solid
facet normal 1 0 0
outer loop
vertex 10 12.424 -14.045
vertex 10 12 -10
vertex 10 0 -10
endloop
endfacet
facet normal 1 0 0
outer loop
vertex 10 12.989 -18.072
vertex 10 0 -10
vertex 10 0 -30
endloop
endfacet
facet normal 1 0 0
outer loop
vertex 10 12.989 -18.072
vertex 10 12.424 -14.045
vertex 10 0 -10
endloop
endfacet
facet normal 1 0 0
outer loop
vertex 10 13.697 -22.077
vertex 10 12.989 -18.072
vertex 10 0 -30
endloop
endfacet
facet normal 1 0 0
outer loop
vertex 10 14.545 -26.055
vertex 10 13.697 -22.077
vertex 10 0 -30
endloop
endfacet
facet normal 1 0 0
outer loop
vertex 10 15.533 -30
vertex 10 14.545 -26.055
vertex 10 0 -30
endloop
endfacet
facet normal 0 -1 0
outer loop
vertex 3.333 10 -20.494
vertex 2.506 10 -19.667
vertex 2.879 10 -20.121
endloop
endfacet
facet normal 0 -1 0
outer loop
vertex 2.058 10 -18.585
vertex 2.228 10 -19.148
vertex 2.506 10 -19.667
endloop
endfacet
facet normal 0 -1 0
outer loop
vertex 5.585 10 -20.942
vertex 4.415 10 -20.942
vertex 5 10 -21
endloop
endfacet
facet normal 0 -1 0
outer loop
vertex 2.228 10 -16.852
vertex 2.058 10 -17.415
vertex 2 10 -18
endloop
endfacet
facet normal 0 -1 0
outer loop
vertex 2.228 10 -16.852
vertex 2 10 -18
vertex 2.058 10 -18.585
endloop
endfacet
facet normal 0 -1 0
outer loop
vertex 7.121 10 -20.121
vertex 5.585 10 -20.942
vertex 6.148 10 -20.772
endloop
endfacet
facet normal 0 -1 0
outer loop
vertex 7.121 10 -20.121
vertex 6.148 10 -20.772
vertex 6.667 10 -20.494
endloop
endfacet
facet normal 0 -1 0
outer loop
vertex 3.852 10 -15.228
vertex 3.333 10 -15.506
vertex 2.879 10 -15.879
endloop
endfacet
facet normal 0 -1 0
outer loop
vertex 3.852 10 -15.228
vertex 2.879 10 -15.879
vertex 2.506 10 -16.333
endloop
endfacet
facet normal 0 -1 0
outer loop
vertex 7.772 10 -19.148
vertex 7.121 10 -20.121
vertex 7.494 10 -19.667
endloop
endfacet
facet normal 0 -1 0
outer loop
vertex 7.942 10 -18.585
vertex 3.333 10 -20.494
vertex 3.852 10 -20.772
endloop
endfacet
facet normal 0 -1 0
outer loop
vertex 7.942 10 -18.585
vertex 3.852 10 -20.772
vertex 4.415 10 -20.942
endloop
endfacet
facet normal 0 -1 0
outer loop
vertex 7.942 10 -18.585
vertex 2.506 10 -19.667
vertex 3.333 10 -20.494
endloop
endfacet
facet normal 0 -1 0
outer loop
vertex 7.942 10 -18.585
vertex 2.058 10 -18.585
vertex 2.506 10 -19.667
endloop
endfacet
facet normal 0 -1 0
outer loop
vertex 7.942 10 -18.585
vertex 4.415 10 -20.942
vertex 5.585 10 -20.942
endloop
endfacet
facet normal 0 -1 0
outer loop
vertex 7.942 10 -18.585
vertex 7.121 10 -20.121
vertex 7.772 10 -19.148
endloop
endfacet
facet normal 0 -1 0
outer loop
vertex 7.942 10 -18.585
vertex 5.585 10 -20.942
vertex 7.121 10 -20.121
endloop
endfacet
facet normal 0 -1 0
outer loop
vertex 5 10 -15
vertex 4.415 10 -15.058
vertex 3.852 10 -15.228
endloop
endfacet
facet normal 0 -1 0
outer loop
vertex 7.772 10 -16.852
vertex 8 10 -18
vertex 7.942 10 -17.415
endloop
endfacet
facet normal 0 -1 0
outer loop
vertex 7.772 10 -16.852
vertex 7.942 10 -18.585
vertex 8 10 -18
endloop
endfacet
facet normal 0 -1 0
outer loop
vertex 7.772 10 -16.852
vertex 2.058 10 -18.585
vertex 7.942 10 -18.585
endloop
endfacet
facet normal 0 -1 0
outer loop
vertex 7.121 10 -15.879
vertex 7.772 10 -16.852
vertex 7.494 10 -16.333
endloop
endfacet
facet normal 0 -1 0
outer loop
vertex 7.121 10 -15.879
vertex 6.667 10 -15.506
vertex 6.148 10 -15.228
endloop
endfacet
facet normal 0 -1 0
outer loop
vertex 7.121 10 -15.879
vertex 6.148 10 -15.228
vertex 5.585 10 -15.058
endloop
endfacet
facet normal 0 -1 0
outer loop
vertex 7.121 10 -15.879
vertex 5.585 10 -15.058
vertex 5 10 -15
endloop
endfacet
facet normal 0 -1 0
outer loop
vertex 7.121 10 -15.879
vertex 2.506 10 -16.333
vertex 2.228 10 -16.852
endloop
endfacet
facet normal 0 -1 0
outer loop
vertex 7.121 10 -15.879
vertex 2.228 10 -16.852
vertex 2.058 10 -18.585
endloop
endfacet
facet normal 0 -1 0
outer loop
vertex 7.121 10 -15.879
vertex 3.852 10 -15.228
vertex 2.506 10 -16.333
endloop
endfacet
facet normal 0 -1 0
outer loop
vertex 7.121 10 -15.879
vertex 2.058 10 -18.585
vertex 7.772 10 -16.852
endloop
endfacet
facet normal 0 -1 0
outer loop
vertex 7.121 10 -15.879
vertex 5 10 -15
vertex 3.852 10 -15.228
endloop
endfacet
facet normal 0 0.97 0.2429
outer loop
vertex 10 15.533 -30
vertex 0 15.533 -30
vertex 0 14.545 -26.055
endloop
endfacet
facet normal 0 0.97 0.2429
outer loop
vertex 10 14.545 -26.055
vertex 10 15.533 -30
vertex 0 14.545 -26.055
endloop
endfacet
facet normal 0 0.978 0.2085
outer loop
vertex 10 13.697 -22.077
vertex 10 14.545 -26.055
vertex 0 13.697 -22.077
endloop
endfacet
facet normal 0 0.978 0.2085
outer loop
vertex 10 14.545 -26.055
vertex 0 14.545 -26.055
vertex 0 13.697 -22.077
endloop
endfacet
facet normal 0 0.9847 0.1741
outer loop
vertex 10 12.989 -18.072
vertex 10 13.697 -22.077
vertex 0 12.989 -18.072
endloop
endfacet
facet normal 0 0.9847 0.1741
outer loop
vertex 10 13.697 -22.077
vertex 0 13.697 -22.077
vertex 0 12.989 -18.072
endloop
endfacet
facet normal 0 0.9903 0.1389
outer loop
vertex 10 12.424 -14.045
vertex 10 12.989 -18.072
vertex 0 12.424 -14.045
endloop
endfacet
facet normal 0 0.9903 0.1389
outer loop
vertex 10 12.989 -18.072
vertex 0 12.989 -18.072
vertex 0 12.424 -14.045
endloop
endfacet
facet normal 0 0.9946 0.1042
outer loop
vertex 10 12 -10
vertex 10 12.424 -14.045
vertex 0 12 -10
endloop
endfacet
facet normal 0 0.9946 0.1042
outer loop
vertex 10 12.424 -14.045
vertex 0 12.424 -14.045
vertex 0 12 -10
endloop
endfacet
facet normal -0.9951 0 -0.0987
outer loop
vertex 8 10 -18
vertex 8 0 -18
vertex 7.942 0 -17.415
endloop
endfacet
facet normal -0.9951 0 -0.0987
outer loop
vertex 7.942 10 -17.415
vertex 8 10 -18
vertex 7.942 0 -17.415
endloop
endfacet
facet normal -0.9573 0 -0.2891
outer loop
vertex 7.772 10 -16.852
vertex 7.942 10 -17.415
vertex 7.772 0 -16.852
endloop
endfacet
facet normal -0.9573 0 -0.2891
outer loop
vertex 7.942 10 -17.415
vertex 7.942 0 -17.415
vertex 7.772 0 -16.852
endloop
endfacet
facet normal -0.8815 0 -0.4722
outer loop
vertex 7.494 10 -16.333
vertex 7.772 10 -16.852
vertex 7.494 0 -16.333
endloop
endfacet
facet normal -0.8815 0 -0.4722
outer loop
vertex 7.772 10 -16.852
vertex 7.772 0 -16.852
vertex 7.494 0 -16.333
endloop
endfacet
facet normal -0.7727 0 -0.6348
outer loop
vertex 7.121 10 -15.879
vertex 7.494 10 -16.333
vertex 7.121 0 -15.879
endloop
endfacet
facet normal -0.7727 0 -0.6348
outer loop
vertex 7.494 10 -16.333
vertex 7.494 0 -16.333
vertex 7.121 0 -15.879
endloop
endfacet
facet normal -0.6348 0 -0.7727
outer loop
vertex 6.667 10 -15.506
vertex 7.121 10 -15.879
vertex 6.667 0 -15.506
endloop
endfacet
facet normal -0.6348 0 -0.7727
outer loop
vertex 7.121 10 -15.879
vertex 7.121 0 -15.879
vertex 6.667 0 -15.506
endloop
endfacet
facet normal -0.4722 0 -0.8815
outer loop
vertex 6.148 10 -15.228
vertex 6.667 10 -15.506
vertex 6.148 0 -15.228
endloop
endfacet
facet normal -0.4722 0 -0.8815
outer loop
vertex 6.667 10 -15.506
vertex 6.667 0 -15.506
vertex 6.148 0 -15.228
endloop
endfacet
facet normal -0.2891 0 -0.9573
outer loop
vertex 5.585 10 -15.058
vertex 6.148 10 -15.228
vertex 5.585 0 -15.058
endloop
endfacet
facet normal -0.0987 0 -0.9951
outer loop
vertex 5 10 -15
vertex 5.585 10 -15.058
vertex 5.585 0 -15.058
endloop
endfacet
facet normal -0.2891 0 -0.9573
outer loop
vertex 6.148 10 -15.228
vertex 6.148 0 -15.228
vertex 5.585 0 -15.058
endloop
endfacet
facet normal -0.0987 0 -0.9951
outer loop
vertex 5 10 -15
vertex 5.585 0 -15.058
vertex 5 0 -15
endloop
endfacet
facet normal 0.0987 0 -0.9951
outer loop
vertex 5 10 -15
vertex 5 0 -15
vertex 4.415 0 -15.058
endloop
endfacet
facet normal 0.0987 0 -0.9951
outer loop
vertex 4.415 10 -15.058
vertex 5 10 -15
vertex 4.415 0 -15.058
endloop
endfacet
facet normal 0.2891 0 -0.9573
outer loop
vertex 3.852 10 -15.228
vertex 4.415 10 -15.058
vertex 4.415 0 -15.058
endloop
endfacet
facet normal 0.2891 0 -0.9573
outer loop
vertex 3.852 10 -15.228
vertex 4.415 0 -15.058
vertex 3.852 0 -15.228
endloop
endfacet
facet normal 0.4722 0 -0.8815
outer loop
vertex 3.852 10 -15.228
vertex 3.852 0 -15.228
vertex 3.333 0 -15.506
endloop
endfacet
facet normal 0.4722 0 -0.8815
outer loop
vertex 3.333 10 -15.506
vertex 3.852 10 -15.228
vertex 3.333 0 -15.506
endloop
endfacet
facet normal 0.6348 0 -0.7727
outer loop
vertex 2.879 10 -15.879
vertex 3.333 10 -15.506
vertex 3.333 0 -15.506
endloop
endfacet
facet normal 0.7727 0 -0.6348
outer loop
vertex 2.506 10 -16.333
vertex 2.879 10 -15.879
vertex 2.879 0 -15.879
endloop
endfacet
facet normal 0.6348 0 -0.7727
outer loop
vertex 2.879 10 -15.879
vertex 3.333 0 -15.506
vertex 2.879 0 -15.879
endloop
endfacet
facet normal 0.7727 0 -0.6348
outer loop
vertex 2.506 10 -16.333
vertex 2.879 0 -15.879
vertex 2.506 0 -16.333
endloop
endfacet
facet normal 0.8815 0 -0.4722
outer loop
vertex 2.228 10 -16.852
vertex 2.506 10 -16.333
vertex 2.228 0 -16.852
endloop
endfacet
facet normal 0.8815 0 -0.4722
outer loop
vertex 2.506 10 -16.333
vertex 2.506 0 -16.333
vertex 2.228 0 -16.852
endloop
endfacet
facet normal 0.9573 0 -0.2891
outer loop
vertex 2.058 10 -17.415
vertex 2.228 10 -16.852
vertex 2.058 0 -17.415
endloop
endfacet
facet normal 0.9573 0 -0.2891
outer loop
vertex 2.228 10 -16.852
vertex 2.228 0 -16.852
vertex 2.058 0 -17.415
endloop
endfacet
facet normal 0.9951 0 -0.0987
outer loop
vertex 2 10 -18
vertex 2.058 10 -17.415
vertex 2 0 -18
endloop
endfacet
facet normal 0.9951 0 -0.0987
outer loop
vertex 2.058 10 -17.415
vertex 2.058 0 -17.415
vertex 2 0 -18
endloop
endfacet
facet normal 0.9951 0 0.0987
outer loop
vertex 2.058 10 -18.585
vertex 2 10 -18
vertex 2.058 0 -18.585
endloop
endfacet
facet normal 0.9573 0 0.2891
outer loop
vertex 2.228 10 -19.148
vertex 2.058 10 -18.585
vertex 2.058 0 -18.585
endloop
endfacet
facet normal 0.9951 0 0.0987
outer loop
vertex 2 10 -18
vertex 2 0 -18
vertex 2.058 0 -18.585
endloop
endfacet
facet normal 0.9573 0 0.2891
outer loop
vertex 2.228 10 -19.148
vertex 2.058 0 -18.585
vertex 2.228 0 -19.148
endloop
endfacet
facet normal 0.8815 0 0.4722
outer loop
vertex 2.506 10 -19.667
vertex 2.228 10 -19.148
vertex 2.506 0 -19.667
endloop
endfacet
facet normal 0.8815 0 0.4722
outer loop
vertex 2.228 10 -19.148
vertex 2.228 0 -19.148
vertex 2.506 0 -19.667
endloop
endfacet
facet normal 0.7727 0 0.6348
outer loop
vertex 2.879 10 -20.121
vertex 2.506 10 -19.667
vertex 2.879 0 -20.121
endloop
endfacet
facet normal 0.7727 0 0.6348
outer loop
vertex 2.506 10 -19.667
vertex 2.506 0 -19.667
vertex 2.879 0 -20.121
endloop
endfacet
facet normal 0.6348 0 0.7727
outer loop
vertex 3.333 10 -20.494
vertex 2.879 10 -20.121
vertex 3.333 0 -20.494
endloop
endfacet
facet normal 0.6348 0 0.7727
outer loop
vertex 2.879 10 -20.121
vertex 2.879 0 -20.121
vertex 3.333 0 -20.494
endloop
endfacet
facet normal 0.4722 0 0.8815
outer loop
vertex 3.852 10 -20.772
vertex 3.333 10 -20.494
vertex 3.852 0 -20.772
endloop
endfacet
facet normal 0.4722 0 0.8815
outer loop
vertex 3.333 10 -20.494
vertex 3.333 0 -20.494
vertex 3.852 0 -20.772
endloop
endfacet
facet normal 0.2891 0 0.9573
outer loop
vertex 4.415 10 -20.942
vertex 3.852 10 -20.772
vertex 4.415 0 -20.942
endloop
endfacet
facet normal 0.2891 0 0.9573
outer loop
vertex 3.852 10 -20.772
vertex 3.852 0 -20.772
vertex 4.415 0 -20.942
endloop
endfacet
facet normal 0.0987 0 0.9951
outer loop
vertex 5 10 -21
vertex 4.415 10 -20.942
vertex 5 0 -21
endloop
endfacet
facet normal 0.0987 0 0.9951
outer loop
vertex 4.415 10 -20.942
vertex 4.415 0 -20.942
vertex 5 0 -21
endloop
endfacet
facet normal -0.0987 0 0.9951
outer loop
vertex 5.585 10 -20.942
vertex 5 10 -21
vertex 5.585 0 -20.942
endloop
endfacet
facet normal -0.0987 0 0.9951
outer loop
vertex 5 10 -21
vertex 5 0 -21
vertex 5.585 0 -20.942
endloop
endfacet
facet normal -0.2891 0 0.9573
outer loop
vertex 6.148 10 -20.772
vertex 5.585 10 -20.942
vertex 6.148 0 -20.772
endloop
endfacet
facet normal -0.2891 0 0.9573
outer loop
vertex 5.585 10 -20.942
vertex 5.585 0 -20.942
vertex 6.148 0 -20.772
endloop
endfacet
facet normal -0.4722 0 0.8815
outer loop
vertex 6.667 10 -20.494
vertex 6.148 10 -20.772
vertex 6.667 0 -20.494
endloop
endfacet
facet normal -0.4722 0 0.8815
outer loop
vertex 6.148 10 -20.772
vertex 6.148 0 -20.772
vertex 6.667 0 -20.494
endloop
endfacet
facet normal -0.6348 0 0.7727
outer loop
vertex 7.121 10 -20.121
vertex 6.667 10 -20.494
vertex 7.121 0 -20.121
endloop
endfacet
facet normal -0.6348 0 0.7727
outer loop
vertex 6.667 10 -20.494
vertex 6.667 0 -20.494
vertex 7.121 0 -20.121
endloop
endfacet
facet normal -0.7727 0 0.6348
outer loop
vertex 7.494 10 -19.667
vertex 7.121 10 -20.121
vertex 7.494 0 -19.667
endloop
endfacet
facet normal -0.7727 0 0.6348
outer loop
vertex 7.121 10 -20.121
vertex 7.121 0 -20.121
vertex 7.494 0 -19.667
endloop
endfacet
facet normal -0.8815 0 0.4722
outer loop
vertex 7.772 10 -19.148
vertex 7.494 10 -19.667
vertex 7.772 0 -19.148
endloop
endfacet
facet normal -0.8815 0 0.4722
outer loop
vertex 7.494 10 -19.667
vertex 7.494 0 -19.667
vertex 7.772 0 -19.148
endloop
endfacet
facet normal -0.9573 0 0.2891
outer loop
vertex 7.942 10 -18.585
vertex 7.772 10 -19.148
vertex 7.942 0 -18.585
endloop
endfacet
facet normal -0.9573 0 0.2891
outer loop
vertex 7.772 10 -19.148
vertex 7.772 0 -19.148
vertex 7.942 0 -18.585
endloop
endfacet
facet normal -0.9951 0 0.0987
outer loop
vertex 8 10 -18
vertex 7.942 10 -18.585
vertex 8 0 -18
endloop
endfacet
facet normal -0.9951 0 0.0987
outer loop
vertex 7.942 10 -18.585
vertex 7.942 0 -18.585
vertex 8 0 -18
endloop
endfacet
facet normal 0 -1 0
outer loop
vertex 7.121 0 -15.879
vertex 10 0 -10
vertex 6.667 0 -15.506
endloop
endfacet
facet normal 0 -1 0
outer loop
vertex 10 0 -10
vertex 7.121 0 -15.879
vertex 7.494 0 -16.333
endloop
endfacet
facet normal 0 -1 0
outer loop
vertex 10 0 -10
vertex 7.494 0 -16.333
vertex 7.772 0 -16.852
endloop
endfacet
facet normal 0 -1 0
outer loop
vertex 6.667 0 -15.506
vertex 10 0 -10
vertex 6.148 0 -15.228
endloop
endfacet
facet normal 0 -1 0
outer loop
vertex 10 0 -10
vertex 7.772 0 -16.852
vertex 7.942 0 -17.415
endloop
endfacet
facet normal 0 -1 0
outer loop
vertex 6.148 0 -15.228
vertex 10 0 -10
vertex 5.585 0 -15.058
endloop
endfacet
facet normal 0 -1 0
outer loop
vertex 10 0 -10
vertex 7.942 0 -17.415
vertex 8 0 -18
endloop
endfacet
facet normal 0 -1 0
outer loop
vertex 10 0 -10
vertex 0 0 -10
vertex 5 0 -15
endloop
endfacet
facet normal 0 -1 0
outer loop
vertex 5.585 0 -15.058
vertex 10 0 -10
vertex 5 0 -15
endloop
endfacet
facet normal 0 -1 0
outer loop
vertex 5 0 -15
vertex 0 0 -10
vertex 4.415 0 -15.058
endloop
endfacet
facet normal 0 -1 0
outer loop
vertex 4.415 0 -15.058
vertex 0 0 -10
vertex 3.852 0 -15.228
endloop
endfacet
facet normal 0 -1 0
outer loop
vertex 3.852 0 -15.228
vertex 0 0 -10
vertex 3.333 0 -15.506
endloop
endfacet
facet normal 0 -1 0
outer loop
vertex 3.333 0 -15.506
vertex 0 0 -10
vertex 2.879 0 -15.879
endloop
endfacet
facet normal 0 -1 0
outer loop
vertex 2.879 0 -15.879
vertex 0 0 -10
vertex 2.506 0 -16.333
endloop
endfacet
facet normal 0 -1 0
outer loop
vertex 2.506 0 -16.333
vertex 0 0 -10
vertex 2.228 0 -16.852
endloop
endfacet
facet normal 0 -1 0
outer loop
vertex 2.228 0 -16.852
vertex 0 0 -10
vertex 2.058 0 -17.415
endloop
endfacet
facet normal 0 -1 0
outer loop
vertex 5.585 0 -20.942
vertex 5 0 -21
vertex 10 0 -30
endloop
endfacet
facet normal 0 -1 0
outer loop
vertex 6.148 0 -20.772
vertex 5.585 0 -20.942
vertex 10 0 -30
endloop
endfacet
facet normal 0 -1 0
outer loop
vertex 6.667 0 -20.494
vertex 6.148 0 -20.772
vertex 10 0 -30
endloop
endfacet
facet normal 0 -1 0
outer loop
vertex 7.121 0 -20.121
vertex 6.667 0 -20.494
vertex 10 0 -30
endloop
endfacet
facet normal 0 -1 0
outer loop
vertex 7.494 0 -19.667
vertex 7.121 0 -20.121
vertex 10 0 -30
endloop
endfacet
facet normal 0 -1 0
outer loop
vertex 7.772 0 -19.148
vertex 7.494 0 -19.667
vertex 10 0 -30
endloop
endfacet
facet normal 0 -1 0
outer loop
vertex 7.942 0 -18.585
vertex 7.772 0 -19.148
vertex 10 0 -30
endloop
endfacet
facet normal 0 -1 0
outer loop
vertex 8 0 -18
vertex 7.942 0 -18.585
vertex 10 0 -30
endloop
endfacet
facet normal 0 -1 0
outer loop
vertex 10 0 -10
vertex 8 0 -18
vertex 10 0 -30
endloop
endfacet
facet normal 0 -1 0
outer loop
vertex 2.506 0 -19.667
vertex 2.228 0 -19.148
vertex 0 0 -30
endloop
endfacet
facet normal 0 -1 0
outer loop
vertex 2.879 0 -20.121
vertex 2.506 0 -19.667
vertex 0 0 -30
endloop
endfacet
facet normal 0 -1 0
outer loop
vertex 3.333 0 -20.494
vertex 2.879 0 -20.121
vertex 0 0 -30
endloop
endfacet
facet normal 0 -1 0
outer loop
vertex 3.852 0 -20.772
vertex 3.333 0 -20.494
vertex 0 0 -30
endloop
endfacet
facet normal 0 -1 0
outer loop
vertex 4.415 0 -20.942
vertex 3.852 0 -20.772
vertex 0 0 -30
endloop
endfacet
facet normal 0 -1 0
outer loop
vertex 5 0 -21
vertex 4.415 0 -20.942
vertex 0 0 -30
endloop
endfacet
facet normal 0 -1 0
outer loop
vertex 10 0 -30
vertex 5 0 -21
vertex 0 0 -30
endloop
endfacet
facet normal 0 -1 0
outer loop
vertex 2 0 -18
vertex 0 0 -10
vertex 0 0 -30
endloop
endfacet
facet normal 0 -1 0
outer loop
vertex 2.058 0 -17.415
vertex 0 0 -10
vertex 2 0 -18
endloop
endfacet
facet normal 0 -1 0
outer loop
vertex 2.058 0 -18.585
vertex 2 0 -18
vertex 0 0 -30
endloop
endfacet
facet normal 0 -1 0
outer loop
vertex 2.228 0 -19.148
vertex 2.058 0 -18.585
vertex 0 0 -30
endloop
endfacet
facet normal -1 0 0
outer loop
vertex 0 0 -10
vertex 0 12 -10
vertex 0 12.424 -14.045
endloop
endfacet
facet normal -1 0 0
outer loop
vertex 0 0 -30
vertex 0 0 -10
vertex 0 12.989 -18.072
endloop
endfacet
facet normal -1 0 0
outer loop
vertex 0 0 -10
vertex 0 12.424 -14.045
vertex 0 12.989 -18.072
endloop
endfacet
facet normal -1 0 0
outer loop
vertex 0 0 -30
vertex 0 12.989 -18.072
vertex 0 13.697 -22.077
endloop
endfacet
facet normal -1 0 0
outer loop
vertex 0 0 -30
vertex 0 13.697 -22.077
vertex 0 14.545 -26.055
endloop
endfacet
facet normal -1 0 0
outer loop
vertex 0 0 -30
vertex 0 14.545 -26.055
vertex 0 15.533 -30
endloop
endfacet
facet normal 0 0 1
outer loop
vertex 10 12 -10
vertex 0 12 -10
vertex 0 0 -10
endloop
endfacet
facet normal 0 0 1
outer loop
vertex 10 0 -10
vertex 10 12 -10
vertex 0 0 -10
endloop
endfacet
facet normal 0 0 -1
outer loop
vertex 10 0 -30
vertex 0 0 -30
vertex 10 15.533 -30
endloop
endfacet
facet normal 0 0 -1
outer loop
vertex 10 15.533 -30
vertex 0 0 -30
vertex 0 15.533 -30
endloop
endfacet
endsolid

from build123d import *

# Parameters (mm, degrees)
EXTRUDE_1_DEPTH     = 10
EXTRUDE_2_DEPTH     = 10
SKETCH_2_R          = 3
CUT_EXTRUDE_1_DEPTH = 10


with BuildPart() as part:
    # 草图1 → 凸台-拉伸1 (new body)
    with BuildSketch(Plane(origin=(0, 0, 0), x_dir=(0, 0, -1), z_dir=(1, 0, 0))):
        with BuildLine():
            Line((10, 12), (10, 0))
            Line((10, 0), (30, 0))
            Line((30, 0), (30, 15.532515952))
            ThreePointArc((30, 15.532515952), (20.077840204, 13.3255511), (10, 12))
        make_face()
    extrude(amount=EXTRUDE_1_DEPTH)

    # 草图1<2> → 凸台-拉伸2 (add)
    with BuildSketch(Plane(origin=(0, 0, 0), x_dir=(0, 0, -1), z_dir=(1, 0, 0))):
        with BuildLine():
            Line((10, 12), (10, 0))
            Line((10, 0), (30, 0))
            Line((30, 0), (30, 15.532515952))
            ThreePointArc((30, 15.532515952), (20.077840204, 13.3255511), (10, 12))
        make_face()
    extrude(amount=EXTRUDE_2_DEPTH)

    # 草图2 → 切除-拉伸1 (cut)
    with BuildSketch(Plane.XZ):
        with Locations((5, -18)):
            Circle(SKETCH_2_R)
    extrude(amount=-CUT_EXTRUDE_1_DEPTH, mode=Mode.SUBTRACT)


solid = part.part
